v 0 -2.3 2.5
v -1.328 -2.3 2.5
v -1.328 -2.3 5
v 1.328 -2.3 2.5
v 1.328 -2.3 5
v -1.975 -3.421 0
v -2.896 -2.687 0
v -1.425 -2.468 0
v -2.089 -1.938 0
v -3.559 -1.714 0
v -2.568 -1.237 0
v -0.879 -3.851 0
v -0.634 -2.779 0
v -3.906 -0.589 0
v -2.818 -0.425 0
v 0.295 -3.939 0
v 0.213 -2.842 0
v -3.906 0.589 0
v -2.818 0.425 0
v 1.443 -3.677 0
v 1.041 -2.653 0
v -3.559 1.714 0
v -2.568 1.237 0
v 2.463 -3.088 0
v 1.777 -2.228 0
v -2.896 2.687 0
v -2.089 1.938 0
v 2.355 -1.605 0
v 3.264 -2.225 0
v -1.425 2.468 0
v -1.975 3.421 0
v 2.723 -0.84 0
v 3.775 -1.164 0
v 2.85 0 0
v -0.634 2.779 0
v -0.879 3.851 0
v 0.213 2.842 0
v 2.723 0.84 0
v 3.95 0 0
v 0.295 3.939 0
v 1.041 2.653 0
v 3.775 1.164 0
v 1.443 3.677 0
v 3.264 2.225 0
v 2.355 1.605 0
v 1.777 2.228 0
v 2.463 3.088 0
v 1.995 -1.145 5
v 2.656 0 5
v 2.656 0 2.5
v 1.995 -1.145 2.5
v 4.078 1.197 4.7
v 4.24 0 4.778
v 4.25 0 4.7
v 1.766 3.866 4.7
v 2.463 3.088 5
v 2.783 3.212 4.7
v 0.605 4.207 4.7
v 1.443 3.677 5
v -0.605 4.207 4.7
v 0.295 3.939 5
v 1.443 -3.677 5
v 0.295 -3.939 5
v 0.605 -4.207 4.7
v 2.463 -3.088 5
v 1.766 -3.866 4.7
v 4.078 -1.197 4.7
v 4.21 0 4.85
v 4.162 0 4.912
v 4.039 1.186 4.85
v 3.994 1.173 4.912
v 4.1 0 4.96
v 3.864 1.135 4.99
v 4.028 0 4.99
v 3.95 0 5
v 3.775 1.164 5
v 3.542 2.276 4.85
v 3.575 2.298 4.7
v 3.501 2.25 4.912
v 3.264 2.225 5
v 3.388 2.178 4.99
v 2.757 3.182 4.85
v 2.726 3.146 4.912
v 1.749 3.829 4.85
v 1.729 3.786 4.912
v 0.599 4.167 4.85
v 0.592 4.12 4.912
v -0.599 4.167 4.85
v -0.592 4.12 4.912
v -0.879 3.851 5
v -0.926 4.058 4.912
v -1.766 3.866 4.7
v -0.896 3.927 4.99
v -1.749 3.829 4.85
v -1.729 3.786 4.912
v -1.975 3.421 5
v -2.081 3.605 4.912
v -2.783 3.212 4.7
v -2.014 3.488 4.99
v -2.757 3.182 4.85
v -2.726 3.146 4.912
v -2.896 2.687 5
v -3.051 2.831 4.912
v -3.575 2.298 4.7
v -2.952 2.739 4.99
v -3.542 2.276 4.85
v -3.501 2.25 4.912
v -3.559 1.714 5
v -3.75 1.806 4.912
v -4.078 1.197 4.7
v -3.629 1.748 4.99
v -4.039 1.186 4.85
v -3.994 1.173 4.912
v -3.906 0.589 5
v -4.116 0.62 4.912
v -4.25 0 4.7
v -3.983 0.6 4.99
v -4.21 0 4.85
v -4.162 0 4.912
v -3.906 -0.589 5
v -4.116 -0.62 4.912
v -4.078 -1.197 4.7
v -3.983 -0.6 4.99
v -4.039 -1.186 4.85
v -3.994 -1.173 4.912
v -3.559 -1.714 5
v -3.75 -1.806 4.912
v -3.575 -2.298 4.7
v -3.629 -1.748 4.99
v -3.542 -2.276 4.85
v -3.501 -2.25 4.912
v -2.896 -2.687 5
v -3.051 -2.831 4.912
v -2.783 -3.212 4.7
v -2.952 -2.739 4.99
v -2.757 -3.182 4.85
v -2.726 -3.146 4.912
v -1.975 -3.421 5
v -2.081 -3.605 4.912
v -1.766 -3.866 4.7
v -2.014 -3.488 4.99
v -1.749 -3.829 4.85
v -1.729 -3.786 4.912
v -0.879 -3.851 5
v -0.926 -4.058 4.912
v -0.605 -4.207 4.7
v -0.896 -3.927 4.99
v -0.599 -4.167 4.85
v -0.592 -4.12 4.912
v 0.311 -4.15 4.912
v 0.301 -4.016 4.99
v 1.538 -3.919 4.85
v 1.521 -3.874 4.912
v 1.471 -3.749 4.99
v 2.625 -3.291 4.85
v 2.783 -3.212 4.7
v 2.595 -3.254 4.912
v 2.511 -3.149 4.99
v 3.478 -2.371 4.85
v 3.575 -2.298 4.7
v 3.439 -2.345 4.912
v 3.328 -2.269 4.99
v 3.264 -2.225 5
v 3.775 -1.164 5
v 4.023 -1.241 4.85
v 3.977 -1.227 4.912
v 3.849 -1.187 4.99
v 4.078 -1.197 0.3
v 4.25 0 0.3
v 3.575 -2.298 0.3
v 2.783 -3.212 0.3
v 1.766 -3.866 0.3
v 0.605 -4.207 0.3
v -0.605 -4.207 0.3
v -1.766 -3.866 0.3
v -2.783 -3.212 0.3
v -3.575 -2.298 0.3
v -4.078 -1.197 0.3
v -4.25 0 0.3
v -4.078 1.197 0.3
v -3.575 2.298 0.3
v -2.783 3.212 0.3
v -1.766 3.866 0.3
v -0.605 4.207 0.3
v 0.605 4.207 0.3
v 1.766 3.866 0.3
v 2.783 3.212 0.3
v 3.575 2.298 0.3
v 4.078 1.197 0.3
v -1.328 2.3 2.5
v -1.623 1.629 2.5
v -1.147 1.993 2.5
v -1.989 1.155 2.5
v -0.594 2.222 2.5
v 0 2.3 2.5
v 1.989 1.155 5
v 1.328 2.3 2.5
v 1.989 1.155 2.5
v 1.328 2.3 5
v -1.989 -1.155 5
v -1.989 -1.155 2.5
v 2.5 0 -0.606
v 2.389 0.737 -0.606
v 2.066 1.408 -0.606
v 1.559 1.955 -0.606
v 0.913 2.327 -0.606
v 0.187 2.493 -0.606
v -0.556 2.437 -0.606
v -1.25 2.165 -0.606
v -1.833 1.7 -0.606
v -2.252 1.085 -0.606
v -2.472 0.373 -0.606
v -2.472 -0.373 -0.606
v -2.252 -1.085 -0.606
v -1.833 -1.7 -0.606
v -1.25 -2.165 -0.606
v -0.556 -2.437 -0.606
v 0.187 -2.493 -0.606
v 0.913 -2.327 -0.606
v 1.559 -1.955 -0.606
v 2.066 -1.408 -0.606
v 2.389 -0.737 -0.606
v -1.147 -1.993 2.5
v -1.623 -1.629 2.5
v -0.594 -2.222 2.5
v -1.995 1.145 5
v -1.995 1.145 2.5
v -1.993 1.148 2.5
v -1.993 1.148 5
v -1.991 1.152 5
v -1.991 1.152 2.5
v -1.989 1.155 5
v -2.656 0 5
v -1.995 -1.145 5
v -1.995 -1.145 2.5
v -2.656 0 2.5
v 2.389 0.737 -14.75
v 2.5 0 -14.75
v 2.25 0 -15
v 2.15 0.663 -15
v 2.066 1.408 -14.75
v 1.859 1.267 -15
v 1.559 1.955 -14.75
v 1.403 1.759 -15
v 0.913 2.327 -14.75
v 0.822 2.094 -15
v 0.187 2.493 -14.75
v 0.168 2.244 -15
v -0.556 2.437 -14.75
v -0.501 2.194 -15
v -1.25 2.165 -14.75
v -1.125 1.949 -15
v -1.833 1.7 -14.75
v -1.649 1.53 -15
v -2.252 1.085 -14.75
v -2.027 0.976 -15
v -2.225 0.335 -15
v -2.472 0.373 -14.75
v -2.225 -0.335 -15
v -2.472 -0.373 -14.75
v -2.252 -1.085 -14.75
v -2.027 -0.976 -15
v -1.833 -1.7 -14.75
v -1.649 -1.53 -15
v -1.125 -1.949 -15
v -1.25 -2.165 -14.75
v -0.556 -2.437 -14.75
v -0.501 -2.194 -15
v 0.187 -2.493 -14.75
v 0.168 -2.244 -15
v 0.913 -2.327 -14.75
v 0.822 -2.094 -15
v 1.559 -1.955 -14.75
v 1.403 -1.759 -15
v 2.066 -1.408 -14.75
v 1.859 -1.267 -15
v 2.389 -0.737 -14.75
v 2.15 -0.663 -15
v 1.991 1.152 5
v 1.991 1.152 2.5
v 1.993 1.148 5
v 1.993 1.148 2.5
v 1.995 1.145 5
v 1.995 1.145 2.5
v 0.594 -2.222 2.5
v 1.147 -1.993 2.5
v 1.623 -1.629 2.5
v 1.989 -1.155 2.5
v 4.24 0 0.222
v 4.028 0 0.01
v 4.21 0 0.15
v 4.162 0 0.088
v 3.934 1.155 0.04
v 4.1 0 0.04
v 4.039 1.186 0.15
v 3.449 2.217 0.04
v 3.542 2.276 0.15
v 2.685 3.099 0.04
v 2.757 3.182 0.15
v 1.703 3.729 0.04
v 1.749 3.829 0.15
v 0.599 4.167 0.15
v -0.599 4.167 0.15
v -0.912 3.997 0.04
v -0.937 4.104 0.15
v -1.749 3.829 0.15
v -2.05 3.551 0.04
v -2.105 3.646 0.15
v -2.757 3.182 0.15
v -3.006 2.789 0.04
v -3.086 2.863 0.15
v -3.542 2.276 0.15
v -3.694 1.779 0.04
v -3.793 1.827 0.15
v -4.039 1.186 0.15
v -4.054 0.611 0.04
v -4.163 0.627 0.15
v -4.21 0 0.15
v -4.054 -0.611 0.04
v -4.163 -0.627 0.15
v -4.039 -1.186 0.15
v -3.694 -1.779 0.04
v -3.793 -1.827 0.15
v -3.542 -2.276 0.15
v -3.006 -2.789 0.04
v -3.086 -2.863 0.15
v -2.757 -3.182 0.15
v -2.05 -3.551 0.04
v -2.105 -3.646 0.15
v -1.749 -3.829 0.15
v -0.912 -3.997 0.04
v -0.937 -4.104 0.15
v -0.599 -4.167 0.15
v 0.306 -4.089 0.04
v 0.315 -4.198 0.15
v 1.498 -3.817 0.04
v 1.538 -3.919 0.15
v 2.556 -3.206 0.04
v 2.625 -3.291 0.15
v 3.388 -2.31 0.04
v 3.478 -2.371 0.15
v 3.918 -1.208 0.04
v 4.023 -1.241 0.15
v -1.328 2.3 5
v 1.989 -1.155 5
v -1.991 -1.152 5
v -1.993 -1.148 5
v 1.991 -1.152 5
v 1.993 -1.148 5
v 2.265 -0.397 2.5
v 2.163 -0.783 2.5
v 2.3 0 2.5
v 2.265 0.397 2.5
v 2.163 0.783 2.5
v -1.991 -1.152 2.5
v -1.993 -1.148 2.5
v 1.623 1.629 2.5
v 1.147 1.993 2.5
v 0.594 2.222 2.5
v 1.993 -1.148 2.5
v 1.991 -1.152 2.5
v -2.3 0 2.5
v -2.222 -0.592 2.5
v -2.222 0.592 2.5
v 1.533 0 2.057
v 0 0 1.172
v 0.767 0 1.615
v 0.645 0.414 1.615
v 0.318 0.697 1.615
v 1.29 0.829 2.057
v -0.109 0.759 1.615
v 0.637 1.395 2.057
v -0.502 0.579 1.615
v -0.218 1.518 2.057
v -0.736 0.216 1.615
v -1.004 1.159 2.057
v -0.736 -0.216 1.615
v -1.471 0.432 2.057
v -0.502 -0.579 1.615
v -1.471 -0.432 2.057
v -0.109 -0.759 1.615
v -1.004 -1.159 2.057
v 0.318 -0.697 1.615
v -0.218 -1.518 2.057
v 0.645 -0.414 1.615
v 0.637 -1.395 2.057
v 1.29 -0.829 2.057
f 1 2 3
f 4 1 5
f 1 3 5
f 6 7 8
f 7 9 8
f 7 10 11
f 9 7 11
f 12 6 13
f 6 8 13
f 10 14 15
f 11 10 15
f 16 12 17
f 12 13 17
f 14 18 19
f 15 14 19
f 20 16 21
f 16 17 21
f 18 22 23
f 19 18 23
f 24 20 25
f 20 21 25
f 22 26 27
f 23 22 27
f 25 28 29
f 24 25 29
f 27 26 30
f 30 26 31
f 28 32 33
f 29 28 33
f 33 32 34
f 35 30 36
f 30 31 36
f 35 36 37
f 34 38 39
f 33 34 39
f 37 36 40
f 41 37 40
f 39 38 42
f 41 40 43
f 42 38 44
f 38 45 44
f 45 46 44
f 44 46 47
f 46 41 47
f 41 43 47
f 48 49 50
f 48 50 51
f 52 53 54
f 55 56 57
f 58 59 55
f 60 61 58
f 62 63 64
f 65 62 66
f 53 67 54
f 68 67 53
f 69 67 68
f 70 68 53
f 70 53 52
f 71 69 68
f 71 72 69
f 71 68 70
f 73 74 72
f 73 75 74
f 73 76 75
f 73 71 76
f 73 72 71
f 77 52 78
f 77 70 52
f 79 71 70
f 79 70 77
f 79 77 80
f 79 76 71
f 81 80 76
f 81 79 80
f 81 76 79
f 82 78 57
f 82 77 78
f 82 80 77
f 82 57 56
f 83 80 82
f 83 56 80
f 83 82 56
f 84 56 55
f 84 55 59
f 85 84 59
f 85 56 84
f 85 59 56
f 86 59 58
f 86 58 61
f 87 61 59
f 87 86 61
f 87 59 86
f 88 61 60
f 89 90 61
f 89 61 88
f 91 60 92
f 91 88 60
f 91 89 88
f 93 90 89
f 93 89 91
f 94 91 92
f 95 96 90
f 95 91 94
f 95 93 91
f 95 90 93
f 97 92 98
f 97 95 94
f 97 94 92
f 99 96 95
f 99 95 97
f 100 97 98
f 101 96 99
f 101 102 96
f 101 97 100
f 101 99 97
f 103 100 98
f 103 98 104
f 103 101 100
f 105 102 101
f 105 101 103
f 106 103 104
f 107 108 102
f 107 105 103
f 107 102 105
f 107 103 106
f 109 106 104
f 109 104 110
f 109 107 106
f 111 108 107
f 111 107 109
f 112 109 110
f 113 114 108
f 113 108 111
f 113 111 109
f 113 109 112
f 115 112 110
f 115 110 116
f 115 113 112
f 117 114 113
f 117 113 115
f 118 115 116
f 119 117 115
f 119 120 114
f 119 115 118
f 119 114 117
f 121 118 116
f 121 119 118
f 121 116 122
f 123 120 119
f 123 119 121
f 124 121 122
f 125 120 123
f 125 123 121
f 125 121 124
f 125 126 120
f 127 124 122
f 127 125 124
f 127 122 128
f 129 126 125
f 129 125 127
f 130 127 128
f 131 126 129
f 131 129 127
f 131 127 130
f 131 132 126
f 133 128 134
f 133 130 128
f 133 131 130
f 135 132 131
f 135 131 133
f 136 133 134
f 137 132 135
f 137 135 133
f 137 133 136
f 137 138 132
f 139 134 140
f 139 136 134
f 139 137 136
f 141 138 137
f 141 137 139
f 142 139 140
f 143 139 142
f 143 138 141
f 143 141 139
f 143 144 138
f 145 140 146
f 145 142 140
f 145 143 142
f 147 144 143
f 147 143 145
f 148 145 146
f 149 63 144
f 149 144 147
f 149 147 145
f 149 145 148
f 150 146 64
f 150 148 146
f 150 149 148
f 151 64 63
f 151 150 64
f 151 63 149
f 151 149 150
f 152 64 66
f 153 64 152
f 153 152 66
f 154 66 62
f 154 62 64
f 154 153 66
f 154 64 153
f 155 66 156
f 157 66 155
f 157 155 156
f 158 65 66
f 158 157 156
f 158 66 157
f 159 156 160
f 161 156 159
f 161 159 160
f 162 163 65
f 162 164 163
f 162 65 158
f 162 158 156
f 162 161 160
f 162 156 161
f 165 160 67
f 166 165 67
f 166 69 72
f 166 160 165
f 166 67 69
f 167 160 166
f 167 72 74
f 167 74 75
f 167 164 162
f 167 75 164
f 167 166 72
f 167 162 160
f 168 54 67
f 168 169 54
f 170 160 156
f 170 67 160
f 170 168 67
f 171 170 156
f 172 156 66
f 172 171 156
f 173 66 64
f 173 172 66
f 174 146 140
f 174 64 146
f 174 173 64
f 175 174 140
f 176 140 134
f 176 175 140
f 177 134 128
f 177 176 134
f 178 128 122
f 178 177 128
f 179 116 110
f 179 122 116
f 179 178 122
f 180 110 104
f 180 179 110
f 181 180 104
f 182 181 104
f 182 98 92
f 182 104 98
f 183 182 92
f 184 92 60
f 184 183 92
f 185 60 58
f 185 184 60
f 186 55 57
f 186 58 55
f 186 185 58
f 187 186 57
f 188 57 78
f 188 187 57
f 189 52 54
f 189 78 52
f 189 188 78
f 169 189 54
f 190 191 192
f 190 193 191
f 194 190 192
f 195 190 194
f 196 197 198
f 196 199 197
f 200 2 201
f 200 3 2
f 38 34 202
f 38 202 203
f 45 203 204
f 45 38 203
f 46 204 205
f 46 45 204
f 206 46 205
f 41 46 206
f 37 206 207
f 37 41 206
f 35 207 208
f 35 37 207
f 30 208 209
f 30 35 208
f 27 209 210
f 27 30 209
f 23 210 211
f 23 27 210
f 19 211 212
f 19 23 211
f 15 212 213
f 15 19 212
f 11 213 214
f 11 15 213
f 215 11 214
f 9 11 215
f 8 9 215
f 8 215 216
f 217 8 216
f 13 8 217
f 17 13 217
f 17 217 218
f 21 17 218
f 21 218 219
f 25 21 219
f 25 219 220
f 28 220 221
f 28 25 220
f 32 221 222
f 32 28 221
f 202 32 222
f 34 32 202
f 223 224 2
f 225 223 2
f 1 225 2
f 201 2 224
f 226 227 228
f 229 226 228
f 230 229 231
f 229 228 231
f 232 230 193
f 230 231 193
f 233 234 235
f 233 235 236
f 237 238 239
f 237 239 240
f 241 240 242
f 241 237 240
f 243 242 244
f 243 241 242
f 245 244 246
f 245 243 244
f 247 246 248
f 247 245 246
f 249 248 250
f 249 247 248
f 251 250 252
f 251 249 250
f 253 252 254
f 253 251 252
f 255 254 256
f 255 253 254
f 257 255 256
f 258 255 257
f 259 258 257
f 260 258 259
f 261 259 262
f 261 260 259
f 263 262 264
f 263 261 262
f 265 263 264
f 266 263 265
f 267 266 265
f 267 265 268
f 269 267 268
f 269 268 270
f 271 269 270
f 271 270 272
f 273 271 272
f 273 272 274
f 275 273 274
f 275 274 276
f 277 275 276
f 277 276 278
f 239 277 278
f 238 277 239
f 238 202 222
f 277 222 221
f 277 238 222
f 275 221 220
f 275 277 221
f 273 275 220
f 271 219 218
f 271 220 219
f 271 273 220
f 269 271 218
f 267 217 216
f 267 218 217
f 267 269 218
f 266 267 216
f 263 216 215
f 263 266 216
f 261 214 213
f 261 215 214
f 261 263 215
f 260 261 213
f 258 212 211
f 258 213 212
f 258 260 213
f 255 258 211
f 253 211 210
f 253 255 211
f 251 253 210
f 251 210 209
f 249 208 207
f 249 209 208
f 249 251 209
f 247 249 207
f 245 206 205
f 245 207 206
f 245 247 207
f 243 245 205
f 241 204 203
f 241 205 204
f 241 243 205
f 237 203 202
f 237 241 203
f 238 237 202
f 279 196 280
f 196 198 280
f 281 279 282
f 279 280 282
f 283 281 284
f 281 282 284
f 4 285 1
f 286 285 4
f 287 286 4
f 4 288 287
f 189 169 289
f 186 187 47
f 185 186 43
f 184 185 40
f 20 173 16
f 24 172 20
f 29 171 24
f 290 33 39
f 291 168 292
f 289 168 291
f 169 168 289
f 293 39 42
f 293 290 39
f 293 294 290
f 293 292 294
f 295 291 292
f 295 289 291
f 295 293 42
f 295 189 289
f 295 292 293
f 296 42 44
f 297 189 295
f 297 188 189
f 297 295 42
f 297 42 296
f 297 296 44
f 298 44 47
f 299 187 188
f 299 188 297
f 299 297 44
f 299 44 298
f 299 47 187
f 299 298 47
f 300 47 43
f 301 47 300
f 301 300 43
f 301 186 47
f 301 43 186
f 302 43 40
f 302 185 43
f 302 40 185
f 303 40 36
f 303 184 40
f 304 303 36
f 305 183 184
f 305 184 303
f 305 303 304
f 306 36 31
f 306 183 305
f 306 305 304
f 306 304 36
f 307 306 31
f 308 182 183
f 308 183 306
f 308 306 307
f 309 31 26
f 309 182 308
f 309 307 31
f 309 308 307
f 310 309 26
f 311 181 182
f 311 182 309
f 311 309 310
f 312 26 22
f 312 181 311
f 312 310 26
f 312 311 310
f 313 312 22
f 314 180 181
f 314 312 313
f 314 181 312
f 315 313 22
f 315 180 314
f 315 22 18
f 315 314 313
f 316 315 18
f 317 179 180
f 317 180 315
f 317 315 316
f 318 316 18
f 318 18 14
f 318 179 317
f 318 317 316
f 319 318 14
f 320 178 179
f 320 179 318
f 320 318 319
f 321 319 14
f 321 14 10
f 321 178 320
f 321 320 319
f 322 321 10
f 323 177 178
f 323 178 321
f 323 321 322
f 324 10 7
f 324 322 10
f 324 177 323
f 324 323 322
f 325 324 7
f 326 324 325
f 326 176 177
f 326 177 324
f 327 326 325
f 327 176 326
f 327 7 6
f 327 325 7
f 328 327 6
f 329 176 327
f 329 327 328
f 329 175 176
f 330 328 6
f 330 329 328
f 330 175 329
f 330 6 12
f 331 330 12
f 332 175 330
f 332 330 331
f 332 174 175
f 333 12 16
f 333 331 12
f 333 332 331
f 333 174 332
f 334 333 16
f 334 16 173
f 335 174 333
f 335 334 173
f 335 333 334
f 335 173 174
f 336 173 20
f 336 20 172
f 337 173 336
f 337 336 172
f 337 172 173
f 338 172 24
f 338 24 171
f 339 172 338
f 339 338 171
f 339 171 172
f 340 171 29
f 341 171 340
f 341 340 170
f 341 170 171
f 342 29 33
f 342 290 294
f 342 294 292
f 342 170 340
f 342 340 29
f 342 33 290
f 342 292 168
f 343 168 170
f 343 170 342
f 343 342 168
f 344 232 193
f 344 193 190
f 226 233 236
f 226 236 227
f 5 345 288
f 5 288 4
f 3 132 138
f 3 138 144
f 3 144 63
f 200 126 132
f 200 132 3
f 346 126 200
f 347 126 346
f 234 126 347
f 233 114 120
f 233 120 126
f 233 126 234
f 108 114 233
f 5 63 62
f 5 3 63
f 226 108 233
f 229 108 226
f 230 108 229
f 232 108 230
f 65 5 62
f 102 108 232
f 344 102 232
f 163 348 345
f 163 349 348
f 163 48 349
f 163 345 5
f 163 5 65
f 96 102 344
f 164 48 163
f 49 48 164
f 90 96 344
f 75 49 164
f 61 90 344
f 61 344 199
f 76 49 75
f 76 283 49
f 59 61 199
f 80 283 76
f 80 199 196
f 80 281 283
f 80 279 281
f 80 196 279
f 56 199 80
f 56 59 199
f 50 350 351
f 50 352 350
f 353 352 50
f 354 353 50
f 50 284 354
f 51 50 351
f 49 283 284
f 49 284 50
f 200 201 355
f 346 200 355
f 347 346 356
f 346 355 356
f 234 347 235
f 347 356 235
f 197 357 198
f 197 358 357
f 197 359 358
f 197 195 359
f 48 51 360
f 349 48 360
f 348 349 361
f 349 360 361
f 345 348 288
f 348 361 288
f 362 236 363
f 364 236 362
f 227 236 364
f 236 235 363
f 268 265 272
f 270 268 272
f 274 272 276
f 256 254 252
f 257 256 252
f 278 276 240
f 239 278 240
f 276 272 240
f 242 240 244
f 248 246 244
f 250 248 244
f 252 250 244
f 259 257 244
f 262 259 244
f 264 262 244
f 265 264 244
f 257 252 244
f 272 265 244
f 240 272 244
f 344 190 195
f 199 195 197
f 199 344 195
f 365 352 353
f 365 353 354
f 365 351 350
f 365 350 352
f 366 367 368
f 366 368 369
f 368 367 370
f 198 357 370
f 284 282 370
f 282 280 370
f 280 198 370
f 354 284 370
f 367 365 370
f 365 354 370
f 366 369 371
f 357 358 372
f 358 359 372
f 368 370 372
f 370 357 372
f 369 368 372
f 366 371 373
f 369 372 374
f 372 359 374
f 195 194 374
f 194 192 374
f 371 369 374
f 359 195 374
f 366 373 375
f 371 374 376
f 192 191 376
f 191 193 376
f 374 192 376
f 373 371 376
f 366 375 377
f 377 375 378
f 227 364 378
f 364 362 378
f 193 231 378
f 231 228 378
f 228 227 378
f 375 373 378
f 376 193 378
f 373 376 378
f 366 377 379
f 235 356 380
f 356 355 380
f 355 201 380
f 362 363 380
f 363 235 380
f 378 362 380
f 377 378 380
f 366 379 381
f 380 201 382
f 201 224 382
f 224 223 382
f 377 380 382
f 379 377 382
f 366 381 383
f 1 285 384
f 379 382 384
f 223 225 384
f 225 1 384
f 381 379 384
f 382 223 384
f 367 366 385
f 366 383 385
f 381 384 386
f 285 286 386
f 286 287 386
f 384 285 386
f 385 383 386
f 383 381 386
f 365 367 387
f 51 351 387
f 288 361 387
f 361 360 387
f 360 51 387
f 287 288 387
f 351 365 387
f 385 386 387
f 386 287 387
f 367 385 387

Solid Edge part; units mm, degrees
sketch "Sketch1" plane through (0, 0, 0) normal (0, -1, 0) x (1, 0, 0)
  line L0 (4.25, 5) -> (4.25, 0)
  line L1 (4.25, 0) -> (2.85, 0)
  line L2 (2.85, 0) -> (2.5, -0.6062)
  line L3 (2.5, -0.6062) -> (2.5, -15)
  line L4 (2.5, -15) -> (0, -15)
  line L5 (2.3, 2.5) -> (0, 1.1721)
  line L6 (2.3, 5) -> (2.3, 2.5)
  line L7 (4.25, 5) -> (2.3, 5)
  dimension "D1" = 2.5
  dimension "D2" = 15
  dimension "D3" = 5
revolve "RevolvedProtrusion1" add sketch "Sketch1" angle 360 about axis through (0, 0, -6) along (0, 0, 1)
cosmetic_thread "Thread1" size "M5"
chamfer "chamfer" distance 0.25 angle 45 1 edges at (-2.5, 0, -15)
fillet "head_roundings" radius 0.3 2 edges at (-4.25, 0, 0) (-4.25, 0, 5)
sketch "Sketch2" plane through (0, 0, 5) normal (0, 0, 1) x (0, 1, 0)
  line L0 (-2.3, 1.3279) -> (-2.3, -1.3279)
  line L1 (0, -2.6558) -> (-2.3, -1.3279)
  line L2 (2.3, -1.3279) -> (0, -2.6558)
  line L3 (2.3, 1.3279) -> (2.3, -1.3279)
  line L4 (0, 2.6558) -> (2.3, 1.3279)
  line L5 (-2.3, 1.3279) -> (0, 2.6558)
extrude "Cutout1" cut sketch "Sketch2" against normal up to vertex (2.5 mm away)
properties part number "STD-DIN912-M5x15" material "Galvanized steel"
